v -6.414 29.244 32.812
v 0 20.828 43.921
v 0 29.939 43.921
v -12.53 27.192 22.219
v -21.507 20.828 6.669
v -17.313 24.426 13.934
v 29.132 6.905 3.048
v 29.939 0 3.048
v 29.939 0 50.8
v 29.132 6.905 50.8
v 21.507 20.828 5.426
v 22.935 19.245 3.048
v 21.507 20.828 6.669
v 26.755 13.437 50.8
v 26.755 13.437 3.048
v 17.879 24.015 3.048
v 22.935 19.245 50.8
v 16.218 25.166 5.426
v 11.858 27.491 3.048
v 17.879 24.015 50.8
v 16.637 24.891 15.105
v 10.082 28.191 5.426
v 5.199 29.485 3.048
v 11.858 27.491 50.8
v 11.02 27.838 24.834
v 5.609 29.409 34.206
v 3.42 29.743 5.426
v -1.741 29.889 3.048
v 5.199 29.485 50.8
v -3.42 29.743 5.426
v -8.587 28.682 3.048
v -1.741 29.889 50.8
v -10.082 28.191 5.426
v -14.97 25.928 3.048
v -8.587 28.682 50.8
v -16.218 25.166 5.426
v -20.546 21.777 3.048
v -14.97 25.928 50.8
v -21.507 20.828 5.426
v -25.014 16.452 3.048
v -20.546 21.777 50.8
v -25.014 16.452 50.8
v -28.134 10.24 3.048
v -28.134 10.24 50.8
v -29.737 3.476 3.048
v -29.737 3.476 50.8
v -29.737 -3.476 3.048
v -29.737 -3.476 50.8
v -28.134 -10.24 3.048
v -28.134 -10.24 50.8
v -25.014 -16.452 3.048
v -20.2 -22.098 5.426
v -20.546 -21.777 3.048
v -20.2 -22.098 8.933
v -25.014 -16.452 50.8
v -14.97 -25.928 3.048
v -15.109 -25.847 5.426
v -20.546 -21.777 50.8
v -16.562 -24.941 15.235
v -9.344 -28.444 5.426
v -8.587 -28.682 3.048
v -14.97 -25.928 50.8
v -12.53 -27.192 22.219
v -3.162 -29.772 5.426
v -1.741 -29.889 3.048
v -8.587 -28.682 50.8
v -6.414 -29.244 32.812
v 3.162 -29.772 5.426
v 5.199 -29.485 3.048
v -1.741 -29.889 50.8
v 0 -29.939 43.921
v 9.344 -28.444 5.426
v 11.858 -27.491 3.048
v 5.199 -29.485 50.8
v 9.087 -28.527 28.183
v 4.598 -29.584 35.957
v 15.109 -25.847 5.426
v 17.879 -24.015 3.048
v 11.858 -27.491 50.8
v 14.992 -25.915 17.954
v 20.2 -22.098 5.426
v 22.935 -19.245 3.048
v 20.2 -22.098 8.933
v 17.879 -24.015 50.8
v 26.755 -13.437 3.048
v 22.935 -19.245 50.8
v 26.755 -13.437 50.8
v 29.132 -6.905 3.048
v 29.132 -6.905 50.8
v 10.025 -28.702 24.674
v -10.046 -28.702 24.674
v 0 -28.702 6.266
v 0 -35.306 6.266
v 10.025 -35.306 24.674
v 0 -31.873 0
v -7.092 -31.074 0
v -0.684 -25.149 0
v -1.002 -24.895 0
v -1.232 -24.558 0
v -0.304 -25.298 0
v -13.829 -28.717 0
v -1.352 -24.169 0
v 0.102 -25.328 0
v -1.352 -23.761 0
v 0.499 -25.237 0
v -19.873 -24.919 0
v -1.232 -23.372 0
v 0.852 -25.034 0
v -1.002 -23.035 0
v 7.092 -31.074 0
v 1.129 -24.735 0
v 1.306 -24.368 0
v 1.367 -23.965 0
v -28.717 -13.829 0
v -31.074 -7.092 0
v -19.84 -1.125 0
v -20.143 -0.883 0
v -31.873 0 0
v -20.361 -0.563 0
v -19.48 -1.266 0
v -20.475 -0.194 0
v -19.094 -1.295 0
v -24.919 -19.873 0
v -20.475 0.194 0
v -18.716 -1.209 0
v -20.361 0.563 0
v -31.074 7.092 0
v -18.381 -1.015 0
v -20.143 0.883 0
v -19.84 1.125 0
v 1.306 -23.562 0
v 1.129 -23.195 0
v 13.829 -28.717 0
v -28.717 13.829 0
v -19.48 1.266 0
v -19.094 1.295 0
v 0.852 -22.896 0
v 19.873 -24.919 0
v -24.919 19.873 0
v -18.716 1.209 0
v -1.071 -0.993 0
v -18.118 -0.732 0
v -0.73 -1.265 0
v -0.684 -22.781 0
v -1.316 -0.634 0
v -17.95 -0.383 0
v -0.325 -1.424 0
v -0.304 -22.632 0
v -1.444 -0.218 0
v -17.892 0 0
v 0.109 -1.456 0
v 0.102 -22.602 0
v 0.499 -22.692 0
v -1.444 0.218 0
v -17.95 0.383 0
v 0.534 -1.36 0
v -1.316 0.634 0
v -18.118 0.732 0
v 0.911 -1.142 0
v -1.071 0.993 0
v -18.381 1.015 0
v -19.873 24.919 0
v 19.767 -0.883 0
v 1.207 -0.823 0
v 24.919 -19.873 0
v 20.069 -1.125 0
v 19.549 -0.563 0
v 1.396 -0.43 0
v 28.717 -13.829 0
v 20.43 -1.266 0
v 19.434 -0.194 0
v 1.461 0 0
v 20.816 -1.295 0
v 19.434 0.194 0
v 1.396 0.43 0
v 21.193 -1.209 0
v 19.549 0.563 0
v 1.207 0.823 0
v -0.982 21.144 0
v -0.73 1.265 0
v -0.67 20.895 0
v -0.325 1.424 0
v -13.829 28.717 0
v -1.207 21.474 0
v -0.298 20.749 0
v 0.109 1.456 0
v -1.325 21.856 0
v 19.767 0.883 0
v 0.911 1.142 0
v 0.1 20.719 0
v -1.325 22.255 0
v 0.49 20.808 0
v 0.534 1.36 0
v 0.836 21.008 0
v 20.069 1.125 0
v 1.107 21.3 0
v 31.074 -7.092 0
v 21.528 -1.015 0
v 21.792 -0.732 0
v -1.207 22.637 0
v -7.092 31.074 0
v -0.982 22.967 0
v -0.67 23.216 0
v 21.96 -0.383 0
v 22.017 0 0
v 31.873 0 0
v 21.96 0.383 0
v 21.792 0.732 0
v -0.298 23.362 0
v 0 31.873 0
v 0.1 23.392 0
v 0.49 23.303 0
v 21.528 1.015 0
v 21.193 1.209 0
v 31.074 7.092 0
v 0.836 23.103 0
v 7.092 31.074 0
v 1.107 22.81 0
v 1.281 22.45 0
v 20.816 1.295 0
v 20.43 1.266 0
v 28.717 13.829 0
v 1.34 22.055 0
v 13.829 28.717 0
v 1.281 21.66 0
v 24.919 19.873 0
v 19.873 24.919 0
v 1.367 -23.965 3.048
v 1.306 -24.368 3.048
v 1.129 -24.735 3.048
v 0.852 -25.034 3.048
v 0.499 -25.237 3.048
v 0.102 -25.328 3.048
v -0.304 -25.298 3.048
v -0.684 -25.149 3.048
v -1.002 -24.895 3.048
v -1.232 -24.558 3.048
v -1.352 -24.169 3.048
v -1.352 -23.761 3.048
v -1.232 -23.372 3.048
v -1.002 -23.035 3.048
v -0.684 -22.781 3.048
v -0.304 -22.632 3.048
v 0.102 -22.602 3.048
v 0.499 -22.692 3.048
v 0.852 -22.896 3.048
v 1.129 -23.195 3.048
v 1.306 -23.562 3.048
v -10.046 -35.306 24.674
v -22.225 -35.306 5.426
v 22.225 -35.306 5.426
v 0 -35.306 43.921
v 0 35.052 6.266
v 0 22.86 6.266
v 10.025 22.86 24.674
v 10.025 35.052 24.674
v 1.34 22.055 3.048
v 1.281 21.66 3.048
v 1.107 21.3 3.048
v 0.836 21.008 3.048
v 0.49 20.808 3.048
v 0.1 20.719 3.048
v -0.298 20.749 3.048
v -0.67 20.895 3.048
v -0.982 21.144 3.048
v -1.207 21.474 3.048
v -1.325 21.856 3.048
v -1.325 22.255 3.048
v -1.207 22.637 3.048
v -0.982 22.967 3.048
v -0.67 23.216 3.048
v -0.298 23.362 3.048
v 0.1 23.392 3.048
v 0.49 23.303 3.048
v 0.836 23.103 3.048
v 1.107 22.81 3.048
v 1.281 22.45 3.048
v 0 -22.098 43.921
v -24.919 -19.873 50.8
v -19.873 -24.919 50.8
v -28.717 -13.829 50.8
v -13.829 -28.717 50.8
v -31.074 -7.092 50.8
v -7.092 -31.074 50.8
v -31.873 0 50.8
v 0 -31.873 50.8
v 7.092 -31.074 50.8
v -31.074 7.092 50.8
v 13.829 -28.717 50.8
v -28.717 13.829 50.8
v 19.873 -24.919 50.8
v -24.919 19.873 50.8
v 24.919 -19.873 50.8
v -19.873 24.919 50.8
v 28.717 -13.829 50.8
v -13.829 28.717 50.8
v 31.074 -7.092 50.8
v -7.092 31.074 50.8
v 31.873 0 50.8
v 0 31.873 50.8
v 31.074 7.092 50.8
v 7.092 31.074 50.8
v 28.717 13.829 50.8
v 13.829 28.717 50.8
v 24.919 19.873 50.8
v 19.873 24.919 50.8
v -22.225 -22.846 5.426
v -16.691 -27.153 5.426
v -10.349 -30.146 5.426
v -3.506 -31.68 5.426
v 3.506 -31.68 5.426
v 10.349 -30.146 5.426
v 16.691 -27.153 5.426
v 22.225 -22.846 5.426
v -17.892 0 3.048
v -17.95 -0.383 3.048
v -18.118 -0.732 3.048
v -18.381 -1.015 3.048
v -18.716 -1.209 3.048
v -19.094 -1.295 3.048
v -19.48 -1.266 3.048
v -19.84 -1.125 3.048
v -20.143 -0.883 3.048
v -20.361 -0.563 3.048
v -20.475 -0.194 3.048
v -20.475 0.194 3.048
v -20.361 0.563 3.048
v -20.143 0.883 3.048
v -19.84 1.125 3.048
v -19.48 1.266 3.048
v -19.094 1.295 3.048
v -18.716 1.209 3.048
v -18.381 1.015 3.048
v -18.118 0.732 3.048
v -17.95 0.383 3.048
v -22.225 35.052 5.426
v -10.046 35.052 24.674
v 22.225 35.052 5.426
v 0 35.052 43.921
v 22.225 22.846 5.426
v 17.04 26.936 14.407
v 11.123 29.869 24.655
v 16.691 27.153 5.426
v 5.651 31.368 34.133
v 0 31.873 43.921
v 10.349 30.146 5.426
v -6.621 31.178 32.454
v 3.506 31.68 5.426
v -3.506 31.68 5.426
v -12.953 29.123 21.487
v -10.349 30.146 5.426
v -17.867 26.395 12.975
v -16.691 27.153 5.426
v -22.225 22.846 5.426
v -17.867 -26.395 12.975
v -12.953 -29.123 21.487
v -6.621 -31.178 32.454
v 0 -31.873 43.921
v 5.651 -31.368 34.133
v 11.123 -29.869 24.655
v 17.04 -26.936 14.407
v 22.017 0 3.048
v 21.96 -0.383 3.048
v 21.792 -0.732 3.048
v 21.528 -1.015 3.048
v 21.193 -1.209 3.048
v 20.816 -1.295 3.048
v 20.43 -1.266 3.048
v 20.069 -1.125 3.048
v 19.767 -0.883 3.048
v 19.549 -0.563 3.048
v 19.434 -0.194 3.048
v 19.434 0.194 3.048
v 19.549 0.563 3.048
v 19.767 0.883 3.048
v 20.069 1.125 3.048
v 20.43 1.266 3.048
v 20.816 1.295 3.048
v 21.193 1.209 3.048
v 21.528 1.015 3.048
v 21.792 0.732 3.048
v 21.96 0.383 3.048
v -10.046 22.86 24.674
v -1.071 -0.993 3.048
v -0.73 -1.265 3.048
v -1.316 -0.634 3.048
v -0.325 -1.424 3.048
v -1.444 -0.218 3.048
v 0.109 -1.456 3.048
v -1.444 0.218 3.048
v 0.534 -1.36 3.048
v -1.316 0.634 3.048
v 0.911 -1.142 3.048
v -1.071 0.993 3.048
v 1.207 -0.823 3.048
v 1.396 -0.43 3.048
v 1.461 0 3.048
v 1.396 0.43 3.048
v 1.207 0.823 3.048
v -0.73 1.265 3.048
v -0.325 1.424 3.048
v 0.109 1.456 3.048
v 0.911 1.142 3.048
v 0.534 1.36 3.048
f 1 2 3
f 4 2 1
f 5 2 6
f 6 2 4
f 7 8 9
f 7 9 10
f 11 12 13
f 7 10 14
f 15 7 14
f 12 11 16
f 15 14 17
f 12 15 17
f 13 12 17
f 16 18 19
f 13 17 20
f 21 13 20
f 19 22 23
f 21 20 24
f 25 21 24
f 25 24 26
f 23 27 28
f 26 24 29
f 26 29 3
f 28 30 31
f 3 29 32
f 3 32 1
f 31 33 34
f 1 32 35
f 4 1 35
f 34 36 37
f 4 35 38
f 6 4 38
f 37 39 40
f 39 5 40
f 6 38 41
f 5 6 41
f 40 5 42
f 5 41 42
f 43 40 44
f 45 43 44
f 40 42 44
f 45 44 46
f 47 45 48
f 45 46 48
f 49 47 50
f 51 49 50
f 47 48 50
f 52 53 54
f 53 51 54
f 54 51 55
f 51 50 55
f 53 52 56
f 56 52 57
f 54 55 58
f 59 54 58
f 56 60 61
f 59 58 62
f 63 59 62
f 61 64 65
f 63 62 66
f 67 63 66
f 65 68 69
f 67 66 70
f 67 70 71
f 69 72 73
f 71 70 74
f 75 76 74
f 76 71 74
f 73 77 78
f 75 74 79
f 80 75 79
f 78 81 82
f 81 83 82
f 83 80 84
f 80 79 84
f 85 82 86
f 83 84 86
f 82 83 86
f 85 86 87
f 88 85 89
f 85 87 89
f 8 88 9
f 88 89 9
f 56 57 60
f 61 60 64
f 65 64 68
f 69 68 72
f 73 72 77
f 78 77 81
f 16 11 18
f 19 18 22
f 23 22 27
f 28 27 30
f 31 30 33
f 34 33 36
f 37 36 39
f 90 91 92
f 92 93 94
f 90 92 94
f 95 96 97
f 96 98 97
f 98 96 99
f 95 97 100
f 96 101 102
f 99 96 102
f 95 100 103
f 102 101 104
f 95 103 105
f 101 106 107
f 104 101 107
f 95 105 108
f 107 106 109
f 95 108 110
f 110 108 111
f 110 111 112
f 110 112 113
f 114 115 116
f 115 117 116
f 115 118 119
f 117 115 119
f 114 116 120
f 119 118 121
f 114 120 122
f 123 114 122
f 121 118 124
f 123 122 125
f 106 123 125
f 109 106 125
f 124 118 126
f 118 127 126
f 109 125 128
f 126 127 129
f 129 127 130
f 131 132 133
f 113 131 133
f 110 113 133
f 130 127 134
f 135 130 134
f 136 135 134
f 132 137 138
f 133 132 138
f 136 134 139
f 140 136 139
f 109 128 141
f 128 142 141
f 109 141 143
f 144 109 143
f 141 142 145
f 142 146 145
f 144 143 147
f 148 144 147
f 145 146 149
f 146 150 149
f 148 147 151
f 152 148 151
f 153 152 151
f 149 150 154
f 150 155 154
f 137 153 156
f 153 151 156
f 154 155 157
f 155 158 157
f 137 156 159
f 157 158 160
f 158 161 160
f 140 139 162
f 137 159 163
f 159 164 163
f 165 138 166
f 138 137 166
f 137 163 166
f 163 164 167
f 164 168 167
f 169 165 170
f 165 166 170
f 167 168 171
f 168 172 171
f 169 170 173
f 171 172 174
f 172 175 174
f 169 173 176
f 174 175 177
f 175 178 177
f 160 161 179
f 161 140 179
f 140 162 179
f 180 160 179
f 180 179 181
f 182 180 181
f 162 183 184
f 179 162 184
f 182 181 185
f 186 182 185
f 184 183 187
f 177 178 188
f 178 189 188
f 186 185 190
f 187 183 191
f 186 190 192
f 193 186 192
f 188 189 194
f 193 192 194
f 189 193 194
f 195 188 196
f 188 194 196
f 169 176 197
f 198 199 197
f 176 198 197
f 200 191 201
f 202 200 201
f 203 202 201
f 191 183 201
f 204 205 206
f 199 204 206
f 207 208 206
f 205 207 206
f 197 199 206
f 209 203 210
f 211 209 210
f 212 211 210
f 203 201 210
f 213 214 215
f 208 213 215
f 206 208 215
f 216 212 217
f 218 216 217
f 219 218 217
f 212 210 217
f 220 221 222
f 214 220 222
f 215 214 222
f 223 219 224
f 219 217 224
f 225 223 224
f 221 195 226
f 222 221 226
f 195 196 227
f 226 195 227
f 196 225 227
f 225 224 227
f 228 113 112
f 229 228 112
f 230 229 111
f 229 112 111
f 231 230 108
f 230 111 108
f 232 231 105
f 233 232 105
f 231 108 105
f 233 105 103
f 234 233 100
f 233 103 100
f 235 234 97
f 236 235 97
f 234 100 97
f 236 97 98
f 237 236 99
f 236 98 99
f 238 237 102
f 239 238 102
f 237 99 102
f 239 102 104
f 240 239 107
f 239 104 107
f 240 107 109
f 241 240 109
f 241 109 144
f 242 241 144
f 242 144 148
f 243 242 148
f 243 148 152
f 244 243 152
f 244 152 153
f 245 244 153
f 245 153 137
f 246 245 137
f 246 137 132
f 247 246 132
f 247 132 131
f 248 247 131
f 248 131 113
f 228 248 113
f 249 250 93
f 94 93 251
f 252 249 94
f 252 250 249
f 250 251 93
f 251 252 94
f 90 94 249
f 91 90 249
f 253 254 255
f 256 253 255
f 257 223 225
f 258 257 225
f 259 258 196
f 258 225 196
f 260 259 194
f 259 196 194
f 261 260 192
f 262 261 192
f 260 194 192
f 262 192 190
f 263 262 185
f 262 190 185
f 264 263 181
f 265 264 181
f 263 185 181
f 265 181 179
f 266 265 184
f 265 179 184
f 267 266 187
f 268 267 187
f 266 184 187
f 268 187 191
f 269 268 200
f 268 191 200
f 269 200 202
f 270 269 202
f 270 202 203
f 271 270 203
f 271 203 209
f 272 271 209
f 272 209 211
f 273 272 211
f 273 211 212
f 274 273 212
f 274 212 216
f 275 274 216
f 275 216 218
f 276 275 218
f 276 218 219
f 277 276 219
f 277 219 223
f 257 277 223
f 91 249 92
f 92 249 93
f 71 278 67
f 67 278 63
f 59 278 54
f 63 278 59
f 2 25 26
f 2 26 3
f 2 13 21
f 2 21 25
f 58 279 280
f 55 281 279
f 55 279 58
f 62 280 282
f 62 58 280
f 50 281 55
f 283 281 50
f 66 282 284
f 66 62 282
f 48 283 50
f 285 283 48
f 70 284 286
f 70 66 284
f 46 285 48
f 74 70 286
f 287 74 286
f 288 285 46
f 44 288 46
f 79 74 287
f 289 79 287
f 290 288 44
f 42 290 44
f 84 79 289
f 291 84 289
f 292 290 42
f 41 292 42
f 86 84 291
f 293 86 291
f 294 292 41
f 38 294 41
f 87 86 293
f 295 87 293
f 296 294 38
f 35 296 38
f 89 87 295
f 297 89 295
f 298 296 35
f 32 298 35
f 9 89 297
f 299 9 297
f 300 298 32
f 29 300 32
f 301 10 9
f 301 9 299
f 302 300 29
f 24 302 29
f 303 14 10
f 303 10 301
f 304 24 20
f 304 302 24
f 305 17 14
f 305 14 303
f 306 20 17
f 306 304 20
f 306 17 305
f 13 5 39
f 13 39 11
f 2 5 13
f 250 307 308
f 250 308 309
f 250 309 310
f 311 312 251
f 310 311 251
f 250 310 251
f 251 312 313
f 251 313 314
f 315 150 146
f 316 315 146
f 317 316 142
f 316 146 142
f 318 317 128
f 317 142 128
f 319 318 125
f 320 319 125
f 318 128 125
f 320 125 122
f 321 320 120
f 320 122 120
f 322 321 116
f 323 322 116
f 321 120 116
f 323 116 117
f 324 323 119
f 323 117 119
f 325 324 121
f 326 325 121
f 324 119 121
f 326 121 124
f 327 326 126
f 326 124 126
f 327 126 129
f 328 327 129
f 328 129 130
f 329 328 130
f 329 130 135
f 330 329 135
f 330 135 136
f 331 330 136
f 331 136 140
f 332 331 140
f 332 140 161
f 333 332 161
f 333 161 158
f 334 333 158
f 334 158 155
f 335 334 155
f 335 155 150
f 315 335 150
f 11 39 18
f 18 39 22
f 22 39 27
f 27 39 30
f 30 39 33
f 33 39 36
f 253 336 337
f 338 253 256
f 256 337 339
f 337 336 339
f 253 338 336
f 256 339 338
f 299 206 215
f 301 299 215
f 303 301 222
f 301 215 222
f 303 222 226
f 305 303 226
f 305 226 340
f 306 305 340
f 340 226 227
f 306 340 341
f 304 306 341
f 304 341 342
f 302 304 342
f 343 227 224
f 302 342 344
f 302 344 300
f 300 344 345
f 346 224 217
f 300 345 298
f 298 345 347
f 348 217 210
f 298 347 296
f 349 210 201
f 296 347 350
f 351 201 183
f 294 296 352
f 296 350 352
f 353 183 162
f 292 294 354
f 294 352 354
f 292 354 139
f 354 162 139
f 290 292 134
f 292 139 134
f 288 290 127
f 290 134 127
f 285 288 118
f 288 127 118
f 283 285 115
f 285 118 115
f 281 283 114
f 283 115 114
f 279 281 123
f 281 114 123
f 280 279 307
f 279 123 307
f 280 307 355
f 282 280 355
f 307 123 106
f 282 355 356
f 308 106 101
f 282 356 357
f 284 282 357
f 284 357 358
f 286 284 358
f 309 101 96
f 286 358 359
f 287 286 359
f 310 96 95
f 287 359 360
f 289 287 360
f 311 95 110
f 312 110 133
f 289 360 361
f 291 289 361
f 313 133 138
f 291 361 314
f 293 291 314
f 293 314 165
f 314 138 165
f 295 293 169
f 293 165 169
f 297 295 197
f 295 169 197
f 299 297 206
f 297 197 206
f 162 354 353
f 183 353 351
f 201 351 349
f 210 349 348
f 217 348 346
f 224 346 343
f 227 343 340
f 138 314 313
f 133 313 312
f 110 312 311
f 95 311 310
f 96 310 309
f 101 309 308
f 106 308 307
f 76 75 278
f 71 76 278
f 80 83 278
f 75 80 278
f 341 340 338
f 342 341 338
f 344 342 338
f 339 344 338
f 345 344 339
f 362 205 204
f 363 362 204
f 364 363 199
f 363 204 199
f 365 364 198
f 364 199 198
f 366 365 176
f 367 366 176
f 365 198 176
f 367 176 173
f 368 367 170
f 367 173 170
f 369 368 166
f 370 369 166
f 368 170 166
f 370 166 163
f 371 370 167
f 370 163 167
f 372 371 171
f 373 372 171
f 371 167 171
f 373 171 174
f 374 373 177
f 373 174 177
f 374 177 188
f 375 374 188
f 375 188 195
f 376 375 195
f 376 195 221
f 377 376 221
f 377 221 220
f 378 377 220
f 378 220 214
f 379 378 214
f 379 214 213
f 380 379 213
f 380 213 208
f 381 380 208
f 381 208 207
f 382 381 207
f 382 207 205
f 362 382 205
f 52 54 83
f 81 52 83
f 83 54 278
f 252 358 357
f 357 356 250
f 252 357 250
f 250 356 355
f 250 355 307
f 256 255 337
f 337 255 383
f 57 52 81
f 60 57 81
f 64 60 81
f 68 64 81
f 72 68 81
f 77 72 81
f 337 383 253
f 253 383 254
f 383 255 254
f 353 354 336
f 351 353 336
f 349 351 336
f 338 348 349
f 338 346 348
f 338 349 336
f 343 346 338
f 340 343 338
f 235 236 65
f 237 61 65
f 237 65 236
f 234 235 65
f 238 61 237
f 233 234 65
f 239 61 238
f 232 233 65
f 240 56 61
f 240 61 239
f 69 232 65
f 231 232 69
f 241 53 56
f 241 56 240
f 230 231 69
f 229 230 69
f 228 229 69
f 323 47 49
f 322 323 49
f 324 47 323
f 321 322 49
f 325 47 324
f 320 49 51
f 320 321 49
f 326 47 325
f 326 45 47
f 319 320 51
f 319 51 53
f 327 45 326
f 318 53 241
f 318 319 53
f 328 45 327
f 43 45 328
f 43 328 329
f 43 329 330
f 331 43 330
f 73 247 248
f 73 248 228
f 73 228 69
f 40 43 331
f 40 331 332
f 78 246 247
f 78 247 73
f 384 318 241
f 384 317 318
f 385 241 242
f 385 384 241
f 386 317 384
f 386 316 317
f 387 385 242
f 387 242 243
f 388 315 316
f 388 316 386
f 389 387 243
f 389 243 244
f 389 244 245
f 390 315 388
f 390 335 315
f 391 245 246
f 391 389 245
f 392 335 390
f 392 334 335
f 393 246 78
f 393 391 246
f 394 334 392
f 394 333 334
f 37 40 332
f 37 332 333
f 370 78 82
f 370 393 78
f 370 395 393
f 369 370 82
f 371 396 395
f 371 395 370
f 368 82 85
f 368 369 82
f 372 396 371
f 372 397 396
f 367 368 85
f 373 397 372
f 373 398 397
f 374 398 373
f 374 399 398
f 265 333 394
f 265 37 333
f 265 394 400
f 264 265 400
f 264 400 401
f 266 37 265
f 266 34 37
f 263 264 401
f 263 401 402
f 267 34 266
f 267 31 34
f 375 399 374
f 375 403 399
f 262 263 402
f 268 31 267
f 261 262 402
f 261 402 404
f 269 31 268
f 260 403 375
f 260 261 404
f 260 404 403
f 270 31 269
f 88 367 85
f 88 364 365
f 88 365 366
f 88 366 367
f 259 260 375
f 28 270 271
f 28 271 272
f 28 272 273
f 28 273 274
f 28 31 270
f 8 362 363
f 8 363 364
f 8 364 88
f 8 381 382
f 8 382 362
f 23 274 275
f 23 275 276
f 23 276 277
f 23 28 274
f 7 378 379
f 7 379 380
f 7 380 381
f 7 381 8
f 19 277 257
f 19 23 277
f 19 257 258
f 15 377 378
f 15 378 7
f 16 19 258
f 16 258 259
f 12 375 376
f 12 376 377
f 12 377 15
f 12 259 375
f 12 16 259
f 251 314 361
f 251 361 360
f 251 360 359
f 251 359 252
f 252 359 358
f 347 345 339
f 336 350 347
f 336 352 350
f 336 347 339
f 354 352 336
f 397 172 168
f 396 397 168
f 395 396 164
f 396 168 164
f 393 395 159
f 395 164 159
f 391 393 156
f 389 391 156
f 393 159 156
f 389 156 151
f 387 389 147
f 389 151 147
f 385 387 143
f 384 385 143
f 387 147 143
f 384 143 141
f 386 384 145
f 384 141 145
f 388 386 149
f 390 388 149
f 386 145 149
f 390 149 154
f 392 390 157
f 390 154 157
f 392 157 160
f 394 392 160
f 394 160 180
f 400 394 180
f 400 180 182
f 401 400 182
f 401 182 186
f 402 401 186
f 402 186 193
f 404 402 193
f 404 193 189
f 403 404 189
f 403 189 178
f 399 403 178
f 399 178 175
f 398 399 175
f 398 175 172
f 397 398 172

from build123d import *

# Parameters (mm, degrees)
F0_R      = 31.8731292534
F1_DEPTH  = 50.8
F2_R      = 29.9394143693
F4_DEPTH  = 47.752
F3_R      = 1.3670276657
F3_R_2    = 1.4605226194
F3_R_3    = 1.340090054
F3_R_4    = 1.298632057
F5_DEPTH  = 25.4
F6_DEPTH  = 25.4
F8_START  = 22.098
F8_DEPTH  = 13.208
F10_DEPTH = 67.1801292534
F11_START = -20.828
F11_DEPTH = 14.224
F12_DEPTH = 70.359
F14_START = -12.192
F14_DEPTH = 2.032
F16_START = -6.604
F16_DEPTH = 6.604


with BuildPart() as f1:
    # F0 (on Top) → F1 (new body)
    with BuildSketch(Plane.XY):
        Circle(F0_R)
    extrude(amount=F1_DEPTH)

    # F2 (on face) → F4 (cut)
    with BuildSketch(Plane.XY.offset(50.8)):
        Circle(F2_R)
    extrude(amount=-F4_DEPTH, mode=Mode.SUBTRACT)

    # F3 (on face) → F5 (cut)
    with BuildSketch(Plane(origin=(0, 0, 0), x_dir=(1, 0, 0), z_dir=(0, 0, -1))):
        with Locations((0, 23.9648092538)):
            Circle(F3_R)
        Circle(F3_R_2)
        with Locations((0, -22.0552626997)):
            Circle(F3_R_3)
        with Locations((-19.1909428686, 0)):
            Circle(F3_R_4)
        with Locations((20.7185801119, 0)):
            Circle(F3_R_4)
    extrude(amount=-F5_DEPTH, mode=Mode.SUBTRACT)

    # F3 (on face) → F6 (cut)
    with BuildSketch(Plane(origin=(0, 0, 0), x_dir=(1, 0, 0), z_dir=(0, 0, -1))):
        with Locations((0, 23.9648092538)):
            Circle(F3_R)
        Circle(F3_R_2)
        with Locations((0, -22.0552626997)):
            Circle(F3_R_3)
        with Locations((-19.1909428686, 0)):
            Circle(F3_R_4)
        with Locations((20.7185801119, 0)):
            Circle(F3_R_4)
    extrude(amount=-F6_DEPTH, mode=Mode.SUBTRACT)

    # F7 (on Front) → F8 (join)
    with BuildSketch(Plane.XZ.offset(F8_START)):
        Polygon((11.1125, 24.6736888855), (0, 43.9211034846), (-11.1125, 24.6736888855), align=None)
        Polygon((0, 5.4262742864), (-11.1125, 24.6736888855), (-22.225, 5.4262742864), align=None)
        Polygon((11.1125, 24.6736888855), (-11.1125, 24.6736888855), (0, 5.4262742864), align=None)
        Polygon((22.225, 5.4262742864), (11.1125, 24.6736888855), (0, 5.4262742864), align=None)
    extrude(amount=F8_DEPTH)

    # F9 (on face) → F10 (cut, through all)
    with BuildSketch(Plane.XZ.offset(35.306)):
        Polygon((10.0251361728, 24.6736888855), (-10.0464997813, 24.6736888855), (0, 6.265532691), align=None)
    extrude(amount=-F10_DEPTH, mode=Mode.SUBTRACT)

    # F7 (on Front) → F11 (join)
    with BuildSketch(Plane.XZ.offset(F11_START)):
        Polygon((11.1125, 24.6736888855), (0, 43.9211034846), (-11.1125, 24.6736888855), align=None)
        Polygon((0, 5.4262742864), (-11.1125, 24.6736888855), (-22.225, 5.4262742864), align=None)
        Polygon((11.1125, 24.6736888855), (-11.1125, 24.6736888855), (0, 5.4262742864), align=None)
        Polygon((22.225, 5.4262742864), (11.1125, 24.6736888855), (0, 5.4262742864), align=None)
    extrude(amount=-F11_DEPTH)

    # F9 (on face) → F12 (cut, through all)
    with BuildSketch(Plane.XZ.offset(35.306)):
        Polygon((10.0251361728, 24.6736888855), (-10.0464997813, 24.6736888855), (0, 6.265532691), align=None)
    extrude(amount=-F12_DEPTH, mode=Mode.SUBTRACT)

    # F13 (on face) → F14 (join)
    with BuildSketch(Plane(origin=(0, 35.052, 0), x_dir=(-1, 0, 0), z_dir=(0, 1, 0)).offset(F14_START)):
        Polygon((10.0464997813, 24.6736888855), (-10.0251361728, 24.6736888855), (0, 6.265532691), align=None)
    extrude(amount=-F14_DEPTH)

    # F15 (on face) → F16 (join)
    with BuildSketch(Plane.XZ.offset(35.306).offset(F16_START)):
        Polygon((10.0251361728, 24.6736888855), (-10.0464997813, 24.6736888855), (0, 6.265532691), align=None)
    extrude(amount=-F16_DEPTH)


solid = f1.part
